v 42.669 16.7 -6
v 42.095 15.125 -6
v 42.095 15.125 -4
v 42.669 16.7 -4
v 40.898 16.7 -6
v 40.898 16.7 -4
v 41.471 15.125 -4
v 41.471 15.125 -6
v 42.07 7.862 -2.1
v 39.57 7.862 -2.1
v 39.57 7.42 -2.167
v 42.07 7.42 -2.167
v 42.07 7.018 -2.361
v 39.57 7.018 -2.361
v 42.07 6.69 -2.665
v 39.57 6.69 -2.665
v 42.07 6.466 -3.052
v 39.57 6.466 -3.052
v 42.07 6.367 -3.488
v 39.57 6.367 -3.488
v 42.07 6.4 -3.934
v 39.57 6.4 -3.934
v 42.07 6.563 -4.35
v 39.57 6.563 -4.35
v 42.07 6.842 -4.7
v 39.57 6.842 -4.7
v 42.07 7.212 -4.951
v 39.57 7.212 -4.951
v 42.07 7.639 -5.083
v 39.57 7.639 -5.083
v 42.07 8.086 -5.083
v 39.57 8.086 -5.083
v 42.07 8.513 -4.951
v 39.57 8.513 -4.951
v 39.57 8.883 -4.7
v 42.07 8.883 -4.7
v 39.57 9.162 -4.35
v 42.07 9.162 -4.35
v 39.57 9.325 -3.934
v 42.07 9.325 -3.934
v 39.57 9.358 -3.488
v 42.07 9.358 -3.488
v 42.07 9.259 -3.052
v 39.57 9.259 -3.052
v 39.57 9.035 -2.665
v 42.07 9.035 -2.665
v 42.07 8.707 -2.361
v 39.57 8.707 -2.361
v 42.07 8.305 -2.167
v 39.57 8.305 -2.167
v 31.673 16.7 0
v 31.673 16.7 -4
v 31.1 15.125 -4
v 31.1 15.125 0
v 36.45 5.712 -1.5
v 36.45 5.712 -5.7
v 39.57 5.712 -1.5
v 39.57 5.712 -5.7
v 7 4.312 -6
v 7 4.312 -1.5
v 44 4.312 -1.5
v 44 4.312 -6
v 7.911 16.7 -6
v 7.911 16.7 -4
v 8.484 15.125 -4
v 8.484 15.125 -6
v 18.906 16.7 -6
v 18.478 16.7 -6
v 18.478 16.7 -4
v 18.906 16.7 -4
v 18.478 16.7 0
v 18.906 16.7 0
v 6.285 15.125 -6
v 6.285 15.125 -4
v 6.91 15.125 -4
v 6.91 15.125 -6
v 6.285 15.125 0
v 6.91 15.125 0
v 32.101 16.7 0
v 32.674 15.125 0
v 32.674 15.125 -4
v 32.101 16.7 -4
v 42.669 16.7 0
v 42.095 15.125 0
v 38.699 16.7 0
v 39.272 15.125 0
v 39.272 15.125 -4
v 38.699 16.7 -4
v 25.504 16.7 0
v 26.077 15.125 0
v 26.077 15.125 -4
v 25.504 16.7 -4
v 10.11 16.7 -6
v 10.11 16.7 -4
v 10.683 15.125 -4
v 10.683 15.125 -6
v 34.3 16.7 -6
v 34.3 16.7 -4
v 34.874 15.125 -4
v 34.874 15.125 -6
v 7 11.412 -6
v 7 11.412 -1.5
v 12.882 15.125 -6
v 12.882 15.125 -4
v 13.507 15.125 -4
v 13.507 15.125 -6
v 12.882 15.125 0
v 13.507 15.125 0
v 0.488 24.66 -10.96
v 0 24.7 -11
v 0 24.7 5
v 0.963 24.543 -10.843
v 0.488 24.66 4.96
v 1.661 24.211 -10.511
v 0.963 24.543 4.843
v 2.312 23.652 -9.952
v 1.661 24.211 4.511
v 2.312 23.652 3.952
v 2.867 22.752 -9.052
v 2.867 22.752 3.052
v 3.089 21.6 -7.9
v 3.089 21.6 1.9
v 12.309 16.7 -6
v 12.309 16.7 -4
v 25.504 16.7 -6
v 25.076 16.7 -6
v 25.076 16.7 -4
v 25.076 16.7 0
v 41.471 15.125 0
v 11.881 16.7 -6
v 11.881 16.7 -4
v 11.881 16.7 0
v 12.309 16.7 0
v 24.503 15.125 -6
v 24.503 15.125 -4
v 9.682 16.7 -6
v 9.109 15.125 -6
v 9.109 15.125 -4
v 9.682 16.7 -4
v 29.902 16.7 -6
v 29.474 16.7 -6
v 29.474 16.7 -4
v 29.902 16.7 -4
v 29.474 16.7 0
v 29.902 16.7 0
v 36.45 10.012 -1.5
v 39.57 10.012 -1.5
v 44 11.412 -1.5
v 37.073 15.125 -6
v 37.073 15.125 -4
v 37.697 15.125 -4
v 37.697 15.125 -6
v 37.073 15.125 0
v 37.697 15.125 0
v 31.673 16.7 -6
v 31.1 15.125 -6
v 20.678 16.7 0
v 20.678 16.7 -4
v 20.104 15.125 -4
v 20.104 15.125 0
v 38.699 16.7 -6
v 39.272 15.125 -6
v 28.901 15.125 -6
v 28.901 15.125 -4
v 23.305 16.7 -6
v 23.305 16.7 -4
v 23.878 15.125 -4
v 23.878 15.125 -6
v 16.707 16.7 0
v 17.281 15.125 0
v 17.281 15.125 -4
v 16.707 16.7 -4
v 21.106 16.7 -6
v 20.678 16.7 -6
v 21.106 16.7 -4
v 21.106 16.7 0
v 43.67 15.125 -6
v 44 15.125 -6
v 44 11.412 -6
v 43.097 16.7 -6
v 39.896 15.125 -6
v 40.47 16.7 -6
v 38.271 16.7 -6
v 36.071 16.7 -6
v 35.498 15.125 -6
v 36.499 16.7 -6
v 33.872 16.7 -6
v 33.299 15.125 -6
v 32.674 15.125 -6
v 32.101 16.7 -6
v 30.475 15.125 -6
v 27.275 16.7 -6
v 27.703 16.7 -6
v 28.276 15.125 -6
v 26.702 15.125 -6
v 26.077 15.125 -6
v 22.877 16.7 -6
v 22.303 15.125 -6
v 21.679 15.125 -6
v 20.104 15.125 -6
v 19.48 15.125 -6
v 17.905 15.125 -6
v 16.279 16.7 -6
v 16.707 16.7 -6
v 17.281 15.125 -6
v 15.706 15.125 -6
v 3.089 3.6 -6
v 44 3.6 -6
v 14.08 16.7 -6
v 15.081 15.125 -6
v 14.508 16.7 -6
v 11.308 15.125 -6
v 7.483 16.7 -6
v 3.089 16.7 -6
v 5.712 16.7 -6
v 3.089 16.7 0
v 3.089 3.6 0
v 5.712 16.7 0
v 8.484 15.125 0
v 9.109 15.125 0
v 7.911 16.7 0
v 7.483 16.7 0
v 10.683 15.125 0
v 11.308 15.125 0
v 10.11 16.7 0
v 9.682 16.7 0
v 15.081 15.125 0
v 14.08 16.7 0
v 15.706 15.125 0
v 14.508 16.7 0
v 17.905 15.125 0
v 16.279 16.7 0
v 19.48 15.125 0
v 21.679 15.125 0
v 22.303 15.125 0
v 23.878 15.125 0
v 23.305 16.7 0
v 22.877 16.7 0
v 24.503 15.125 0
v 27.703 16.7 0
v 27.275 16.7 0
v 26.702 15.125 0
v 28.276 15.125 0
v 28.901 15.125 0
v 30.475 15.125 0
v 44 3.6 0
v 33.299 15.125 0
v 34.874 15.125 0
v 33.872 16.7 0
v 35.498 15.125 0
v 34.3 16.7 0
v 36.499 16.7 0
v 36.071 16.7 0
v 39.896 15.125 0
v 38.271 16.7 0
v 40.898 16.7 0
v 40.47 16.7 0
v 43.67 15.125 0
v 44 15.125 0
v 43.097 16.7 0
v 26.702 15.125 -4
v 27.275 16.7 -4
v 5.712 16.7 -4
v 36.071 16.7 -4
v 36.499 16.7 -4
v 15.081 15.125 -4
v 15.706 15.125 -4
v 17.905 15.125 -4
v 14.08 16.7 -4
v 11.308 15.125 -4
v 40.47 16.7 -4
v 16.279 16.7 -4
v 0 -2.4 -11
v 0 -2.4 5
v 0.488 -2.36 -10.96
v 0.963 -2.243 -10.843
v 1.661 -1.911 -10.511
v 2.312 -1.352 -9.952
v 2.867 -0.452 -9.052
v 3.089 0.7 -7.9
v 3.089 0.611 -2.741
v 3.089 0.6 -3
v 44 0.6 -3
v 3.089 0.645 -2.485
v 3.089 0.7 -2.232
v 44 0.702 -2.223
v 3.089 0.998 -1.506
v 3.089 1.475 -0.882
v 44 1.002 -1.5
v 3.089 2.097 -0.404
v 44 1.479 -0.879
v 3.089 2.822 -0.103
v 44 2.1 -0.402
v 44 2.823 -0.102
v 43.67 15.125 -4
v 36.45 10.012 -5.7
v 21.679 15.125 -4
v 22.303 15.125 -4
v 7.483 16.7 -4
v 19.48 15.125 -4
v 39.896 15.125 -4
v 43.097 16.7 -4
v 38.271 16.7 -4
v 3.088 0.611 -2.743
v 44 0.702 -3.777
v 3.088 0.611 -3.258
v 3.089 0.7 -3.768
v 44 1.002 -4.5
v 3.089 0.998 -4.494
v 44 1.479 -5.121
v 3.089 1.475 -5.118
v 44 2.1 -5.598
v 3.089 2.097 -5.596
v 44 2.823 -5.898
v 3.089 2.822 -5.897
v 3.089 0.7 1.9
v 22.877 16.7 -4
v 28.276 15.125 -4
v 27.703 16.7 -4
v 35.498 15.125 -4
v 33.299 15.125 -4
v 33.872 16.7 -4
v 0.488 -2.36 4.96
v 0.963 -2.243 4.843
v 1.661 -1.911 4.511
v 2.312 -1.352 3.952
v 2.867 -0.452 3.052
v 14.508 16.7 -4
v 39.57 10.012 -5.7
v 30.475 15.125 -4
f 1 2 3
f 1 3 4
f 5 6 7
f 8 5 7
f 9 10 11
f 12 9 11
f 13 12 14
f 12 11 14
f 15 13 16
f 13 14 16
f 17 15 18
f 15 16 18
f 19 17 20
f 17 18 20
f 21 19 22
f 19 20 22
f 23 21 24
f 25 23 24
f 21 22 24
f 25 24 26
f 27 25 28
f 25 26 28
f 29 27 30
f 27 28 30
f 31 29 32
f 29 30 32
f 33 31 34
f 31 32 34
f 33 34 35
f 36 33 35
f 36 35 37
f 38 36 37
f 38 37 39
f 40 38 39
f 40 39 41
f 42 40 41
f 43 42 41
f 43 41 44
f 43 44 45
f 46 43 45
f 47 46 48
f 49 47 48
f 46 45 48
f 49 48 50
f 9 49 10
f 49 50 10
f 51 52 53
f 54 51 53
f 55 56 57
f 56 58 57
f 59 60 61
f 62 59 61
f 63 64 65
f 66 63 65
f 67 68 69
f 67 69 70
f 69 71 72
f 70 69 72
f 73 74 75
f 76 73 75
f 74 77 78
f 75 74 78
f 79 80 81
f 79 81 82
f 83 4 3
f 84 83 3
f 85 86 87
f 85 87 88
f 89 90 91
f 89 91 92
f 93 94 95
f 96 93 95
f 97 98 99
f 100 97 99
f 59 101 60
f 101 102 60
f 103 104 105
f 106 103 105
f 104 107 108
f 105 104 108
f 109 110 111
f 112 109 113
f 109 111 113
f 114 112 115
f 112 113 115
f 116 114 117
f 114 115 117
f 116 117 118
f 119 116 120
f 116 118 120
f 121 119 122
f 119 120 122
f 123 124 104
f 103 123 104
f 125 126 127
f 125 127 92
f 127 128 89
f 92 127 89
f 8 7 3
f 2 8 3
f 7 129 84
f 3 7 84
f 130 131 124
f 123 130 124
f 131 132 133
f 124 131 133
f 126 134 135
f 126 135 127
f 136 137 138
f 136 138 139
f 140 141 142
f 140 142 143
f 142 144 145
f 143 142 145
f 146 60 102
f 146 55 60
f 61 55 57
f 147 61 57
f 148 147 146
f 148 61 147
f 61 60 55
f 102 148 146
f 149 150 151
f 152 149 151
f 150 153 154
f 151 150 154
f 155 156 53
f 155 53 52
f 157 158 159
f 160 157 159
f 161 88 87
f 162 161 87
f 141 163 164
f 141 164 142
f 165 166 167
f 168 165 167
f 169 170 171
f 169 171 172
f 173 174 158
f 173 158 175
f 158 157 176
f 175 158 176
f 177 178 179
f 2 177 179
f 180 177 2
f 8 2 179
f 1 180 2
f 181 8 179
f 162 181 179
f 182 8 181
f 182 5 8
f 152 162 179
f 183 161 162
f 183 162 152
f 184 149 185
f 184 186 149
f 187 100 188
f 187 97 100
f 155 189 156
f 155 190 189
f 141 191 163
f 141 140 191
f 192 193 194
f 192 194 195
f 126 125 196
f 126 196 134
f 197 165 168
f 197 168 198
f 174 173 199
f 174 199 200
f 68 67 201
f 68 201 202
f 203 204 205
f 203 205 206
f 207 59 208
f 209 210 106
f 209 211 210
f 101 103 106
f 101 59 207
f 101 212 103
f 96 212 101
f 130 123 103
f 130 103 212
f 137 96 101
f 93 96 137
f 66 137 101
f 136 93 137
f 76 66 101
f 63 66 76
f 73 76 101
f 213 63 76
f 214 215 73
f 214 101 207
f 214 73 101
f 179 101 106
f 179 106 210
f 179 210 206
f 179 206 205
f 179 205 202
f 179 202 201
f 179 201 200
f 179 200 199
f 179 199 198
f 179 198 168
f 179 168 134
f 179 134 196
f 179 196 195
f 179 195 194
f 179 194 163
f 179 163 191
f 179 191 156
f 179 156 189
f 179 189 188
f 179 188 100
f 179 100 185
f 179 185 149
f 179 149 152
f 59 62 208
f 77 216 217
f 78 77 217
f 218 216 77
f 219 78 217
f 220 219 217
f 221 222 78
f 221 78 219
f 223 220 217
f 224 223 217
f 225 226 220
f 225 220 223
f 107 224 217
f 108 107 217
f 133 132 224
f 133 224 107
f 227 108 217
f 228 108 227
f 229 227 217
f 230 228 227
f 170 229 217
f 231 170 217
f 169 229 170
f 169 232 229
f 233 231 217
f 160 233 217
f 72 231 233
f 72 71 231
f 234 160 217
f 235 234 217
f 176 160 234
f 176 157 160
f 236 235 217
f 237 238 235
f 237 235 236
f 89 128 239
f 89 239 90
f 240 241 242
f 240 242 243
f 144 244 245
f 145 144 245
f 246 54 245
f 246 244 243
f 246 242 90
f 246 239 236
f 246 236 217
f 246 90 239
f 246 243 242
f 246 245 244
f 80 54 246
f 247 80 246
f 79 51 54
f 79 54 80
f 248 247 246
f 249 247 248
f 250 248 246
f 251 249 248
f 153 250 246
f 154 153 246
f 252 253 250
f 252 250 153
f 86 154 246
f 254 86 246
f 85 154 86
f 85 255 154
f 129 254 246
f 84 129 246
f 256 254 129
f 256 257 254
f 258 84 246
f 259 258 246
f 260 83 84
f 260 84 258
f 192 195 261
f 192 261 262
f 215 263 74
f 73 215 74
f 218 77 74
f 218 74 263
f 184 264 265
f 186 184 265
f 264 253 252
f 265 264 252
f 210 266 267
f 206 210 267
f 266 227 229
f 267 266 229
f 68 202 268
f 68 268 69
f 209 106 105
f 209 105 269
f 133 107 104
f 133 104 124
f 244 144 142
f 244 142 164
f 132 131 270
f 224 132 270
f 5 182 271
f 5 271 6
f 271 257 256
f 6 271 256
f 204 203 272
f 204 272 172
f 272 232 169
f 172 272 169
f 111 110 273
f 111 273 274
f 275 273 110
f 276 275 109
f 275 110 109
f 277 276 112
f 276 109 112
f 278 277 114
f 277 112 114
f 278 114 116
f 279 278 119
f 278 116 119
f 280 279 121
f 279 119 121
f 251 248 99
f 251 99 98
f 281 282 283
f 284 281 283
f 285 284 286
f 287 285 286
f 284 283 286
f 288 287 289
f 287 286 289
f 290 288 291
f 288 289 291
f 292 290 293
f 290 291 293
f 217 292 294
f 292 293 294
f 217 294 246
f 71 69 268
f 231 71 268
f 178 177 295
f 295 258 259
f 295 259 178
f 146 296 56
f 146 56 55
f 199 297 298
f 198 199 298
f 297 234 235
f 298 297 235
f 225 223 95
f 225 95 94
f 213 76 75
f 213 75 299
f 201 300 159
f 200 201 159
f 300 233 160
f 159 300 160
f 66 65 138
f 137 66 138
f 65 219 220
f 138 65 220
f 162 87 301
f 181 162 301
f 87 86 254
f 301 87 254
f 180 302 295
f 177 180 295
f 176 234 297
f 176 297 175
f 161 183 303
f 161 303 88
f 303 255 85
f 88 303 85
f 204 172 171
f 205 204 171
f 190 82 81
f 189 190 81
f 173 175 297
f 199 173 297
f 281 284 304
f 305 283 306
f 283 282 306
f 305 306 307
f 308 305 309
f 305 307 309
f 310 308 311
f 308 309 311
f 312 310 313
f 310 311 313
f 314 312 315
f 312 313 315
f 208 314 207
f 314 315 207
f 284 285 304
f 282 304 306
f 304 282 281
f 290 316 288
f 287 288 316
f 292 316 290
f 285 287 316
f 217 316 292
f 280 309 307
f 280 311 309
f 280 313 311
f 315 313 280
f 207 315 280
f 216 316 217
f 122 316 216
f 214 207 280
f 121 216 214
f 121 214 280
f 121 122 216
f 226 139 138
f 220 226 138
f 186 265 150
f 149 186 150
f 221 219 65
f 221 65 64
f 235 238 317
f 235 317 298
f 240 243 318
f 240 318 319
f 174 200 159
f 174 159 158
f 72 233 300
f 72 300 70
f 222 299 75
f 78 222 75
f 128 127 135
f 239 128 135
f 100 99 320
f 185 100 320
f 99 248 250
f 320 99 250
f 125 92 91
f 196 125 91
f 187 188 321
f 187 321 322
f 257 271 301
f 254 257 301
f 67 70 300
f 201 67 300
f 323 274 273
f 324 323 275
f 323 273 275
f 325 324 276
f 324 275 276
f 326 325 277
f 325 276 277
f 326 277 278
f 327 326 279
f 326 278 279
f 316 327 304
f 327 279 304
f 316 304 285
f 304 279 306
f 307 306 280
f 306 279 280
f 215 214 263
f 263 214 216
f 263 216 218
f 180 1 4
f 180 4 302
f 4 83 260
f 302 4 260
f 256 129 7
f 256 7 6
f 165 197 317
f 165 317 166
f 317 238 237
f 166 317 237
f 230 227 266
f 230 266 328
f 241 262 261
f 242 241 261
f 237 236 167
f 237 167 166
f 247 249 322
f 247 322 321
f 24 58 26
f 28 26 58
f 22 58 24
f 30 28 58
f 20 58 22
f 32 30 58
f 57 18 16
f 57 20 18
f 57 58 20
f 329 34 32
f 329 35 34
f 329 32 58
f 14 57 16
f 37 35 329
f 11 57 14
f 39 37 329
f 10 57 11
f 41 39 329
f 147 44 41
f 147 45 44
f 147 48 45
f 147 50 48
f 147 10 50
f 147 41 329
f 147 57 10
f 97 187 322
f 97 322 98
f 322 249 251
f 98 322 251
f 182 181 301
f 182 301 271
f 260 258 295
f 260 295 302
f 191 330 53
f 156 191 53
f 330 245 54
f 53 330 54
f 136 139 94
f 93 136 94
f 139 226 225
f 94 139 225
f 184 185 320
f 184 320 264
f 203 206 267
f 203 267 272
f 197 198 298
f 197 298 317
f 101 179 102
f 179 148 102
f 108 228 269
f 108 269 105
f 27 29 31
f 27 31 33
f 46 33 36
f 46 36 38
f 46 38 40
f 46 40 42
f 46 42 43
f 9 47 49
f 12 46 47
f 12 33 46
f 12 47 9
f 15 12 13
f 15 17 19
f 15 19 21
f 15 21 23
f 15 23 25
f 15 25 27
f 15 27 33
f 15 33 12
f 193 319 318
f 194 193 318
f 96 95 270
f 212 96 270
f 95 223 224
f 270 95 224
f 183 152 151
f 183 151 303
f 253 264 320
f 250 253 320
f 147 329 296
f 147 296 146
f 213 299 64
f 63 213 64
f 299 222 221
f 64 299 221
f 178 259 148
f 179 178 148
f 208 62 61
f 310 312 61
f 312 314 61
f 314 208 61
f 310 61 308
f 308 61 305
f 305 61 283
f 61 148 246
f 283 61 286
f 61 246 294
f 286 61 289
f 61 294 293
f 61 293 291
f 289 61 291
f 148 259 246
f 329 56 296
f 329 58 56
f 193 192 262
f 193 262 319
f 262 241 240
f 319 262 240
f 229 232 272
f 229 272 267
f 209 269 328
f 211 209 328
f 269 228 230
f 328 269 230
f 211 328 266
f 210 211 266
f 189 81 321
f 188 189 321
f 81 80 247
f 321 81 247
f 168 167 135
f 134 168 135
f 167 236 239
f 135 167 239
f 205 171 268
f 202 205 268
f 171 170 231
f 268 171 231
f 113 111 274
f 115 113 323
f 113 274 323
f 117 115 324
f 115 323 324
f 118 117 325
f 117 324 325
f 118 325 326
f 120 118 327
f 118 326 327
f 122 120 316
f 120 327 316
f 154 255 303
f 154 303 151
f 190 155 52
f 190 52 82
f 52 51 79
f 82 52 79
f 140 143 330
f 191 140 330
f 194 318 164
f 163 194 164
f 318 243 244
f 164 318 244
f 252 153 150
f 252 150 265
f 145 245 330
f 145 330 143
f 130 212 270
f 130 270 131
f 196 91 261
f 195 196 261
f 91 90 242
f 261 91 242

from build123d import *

# Parameters (mm, degrees)
BLANKSKE_W               = 44
BLANKSKE_H               = 16.7
BLANK_DEPTH              = 4
TOOTHCUTSIM_DEPTH        = 48.232298271
TEETHCUTS_COUNT          = 21
TEETHCUTS_PITCH          = 2.199114855
CROQUIS2_W               = 44
CROQUIS2_H               = 4
CORTAR_EXTRUIR2_DEPTH    = 0.6
CROQUIS3_W               = 2.5
CROQUIS3_H               = 7.1
CORTAR_EXTRUIR3_DEPTH    = 37
CROQUIS4_W               = 5.711786687
CROQUIS4_H               = 1.575
SALIENTE_EXTRUIR4_DEPTH  = 4
CROQUIS5_W               = 1.12
CROQUIS5_H               = 4.3
SALIENTE_EXTRUIR5_DEPTH  = 4.2
CROQUIS14_R              = 1.5
SALIENTE_EXTRUIR11_DEPTH = 2.5
CROQUIS15_W              = 3.088906297
CROQUIS15_H              = 16.1
SALIENTE_EXTRUIR12_DEPTH = 5
CROQUIS16_W              = 2.855893344
CROQUIS16_H              = 16.1
SALIENTE_EXTRUIR13_DEPTH = 5
SALIENTE_EXTRUIR14_DEPTH = 2
CROQUIS18_W              = 4.2
CROQUIS18_H              = 4.3
SALIENTE_EXTRUIR15_DEPTH = 2
CROQUIS19_W              = 2.855893344
CROQUIS19_H              = 14
SALIENTE_EXTRUIR16_DEPTH = 8
CROQUIS20_W              = 2.855893344
CROQUIS20_H              = 24.1
SALIENTE_EXTRUIR18_DEPTH = 2
SALIENTE_EXTRUIR19_DEPTH = 3
CROQUIS31_W              = 2.855893344
CROQUIS31_H              = 27.1
SALIENTE_EXTRUIR20_DEPTH = 16
CROQUIS32_W              = 3.088906297
CROQUIS32_H              = 27.1
SALIENTE_EXTRUIR21_DEPTH = 16
REDONDEO3_R              = 3
REDONDEO4_R              = 3.1


# Some blends are built 0.0001 mm under size
with BuildPart() as part:
    # BlankSke → Blank (new body)
    with BuildSketch(Plane.XY):
        with Locations((22, 8.35)):
            Rectangle(BLANKSKE_W, BLANKSKE_H)
    extrude(amount=-BLANK_DEPTH)

    # TooCutSkeSim → ToothCutSim (cut, through all)
    with BuildSketch(Plane.XY):
        Polygon((0.312304759, 15.125), (-0.312304759, 15.125), (-0.894802722, 16.7254), (0.894802722, 16.7254), align=None)
    toothcutsim = extrude(amount=-TOOTHCUTSIM_DEPTH, mode=Mode.SUBTRACT)

    # TeethCuts: ToothCutSim ×21
    with Locations(*[(i * TEETHCUTS_PITCH, 0, 0) for i in range(1, TEETHCUTS_COUNT)]):
        add(toothcutsim, mode=Mode.SUBTRACT)

    # Croquis2 → Cortar-Extruir2 (cut)
    with BuildSketch(Plane.XZ):
        with Locations((22, -2)):
            Rectangle(CROQUIS2_W, CROQUIS2_H)
    extrude(amount=-CORTAR_EXTRUIR2_DEPTH, mode=Mode.SUBTRACT)

    # Croquis3 → Cortar-Extruir3 (cut)
    with BuildSketch(Plane(origin=(44, 0, 0), x_dir=(0, 0, -1), z_dir=(1, 0, 0))):
        with Locations((2.75, 7.8625)):
            Rectangle(CROQUIS3_W, CROQUIS3_H)
    extrude(amount=-CORTAR_EXTRUIR3_DEPTH, mode=Mode.SUBTRACT)

    # Croquis4 → Saliente-Extruir4 (add)
    with BuildSketch(Plane.XY):
        with Locations((2.855893344, 15.9125)):
            Rectangle(CROQUIS4_W, CROQUIS4_H)
    extrude(amount=-SALIENTE_EXTRUIR4_DEPTH)

    # Croquis5 → Saliente-Extruir5 (add)
    with BuildSketch(Plane(origin=(0, 0, -1.5), x_dir=(-1, 0, 0), z_dir=(0, 0, -1))):
        with Locations((-39.01, 7.8625)):
            Rectangle(CROQUIS5_W, CROQUIS5_H)
    extrude(amount=SALIENTE_EXTRUIR5_DEPTH)

    # Croquis14 → Saliente-Extruir11 (add)
    with BuildSketch(Plane(origin=(39.57, 0, 0), x_dir=(0, 0, -1), z_dir=(1, 0, 0))):
        with Locations(Location((3.6, 7.8625, 0), (0, 0, 180))):
            Circle(CROQUIS14_R)
    extrude(amount=SALIENTE_EXTRUIR11_DEPTH)

    # Croquis15 → Saliente-Extruir12 (add)
    with BuildSketch(Plane.XY):
        with Locations((1.544453149, 8.65)):
            Rectangle(CROQUIS15_W, CROQUIS15_H)
    extrude(amount=SALIENTE_EXTRUIR12_DEPTH)

    # Croquis16 → Saliente-Extruir13 (add)
    with BuildSketch(Plane(origin=(0, 0, -4), x_dir=(-1, 0, 0), z_dir=(0, 0, -1))):
        with Locations((-1.427946672, 8.65)):
            Rectangle(CROQUIS16_W, CROQUIS16_H)
    extrude(amount=SALIENTE_EXTRUIR13_DEPTH)

    # Croquis17 → Saliente-Extruir14 (add)
    with BuildSketch(Plane(origin=(0, 0, -4), x_dir=(-1, 0, 0), z_dir=(0, 0, -1))):
        Polygon((-44, 0.6), (-2.855893344, 0.6), (-2.855893344, 16.7), (-5.711786687, 16.7), (-6.285039806, 15.125), (-6.909649324, 15.125), (-7.482902443, 16.7), (-7.910901542, 16.7), (-8.484154661, 15.125), (-9.108764179, 15.125), (-9.682017298, 16.7), (-10.110016397, 16.7), (-10.683269516, 15.125), (-11.307879034, 15.125), (-11.881132153, 16.7), (-12.309131252, 16.7), (-12.882384371, 15.125), (-13.506993889, 15.125), (-14.080247008, 16.7), (-14.508246107, 16.7), (-15.081499226, 15.125), (-15.706108744, 15.125), (-16.279361863, 16.7), (-16.707360962, 16.7), (-17.280614081, 15.125), (-17.905223599, 15.125), (-18.478476718, 16.7), (-18.906475817, 16.7), (-19.479728936, 15.125), (-20.104338454, 15.125), (-20.677591573, 16.7), (-21.105590672, 16.7), (-21.678843791, 15.125), (-22.303453309, 15.125), (-22.876706428, 16.7), (-23.304705527, 16.7), (-23.877958646, 15.125), (-24.502568164, 15.125), (-25.075821283, 16.7), (-25.503820382, 16.7), (-26.077073501, 15.125), (-26.701683019, 15.125), (-27.274936138, 16.7), (-27.702935237, 16.7), (-28.276188356, 15.125), (-28.900797874, 15.125), (-29.474050993, 16.7), (-29.902050092, 16.7), (-30.475303211, 15.125), (-31.099912729, 15.125), (-31.673165848, 16.7), (-32.101164947, 16.7), (-32.674418066, 15.125), (-33.299027584, 15.125), (-33.872280703, 16.7), (-34.300279802, 16.7), (-34.873532921, 15.125), (-35.498142439, 15.125), (-36.071395558, 16.7), (-36.499394657, 16.7), (-37.072647776, 15.125), (-37.697257294, 15.125), (-38.270510413, 16.7), (-38.698509512, 16.7), (-39.271762631, 15.125), (-39.896372149, 15.125), (-40.469625268, 16.7), (-40.897624367, 16.7), (-41.470877486, 15.125), (-42.095487004, 15.125), (-42.668740123, 16.7), (-43.096739222, 16.7), (-43.669992341, 15.125), (-44, 15.125), (-44, 11.4125), (-7, 11.4125), (-7, 4.3125), (-44, 4.3125), align=None)
    extrude(amount=SALIENTE_EXTRUIR14_DEPTH)

    # Croquis18 → Saliente-Extruir15 (add)
    with BuildSketch(Plane.ZY.offset(-38.45)):
        with Locations((-3.6, 7.8625)):
            Rectangle(CROQUIS18_W, CROQUIS18_H)
    extrude(amount=SALIENTE_EXTRUIR15_DEPTH)

    # Croquis19 → Saliente-Extruir16 (add)
    with BuildSketch(Plane(origin=(0, 16.7, 0), x_dir=(1, 0, 0), z_dir=(0, 1, 0))):
        with Locations((1.427946672, 2)):
            Rectangle(CROQUIS19_W, CROQUIS19_H)
    extrude(amount=SALIENTE_EXTRUIR16_DEPTH)

    # Croquis20 → Saliente-Extruir18 (add)
    with BuildSketch(Plane(origin=(0, 0, -9), x_dir=(-1, 0, 0), z_dir=(0, 0, -1))):
        with Locations((-1.427946672, 12.65)):
            Rectangle(CROQUIS20_W, CROQUIS20_H)
    extrude(amount=SALIENTE_EXTRUIR18_DEPTH)

    # Croquis21 → Saliente-Extruir19 (add)
    with BuildSketch(Plane.XZ.offset(-0.6)):
        Polygon((3.088906297, 0), (2.855893344, -6), (2.855893344, -11), (0, -11), (0, 5), (3.088906297, 5), align=None)
    extrude(amount=SALIENTE_EXTRUIR19_DEPTH)

    # Croquis31 → Saliente-Extruir20 (add)
    with BuildSketch(Plane(origin=(0, 0, -11), x_dir=(-1, 0, 0), z_dir=(0, 0, -1))):
        with Locations((-1.427946672, 11.15)):
            Rectangle(CROQUIS31_W, CROQUIS31_H)
    extrude(amount=-SALIENTE_EXTRUIR20_DEPTH)

    # Croquis32 → Saliente-Extruir21 (add)
    with BuildSketch(Plane.XY.offset(5)):
        with Locations((1.544453149, 11.15)):
            Rectangle(CROQUIS32_W, CROQUIS32_H)
    extrude(amount=-SALIENTE_EXTRUIR21_DEPTH)

    # Redondeo3
    redondeo3_edges = [part.edges().sort_by_distance(p)[0] for p in [
        (23.544453148, 0.6, -6),
        (23.544453148, 0.6, 0),
    ]]
    fillet(redondeo3_edges, radius=REDONDEO3_R - 0.0001)  # a hair under: the kernel refuses the full size

    # Redondeo4
    # the kernel refuses this fillet: 3.1 mm, written as the material it takes off along each edge
    with BuildSketch(Plane(origin=(3.088906297, -2.4, -18.75), x_dir=(0, 1, 0), z_dir=(0, 0, 1))) as redondeo4_piece_1_section:
        with BuildLine():
            CenterArc((REDONDEO4_R, REDONDEO4_R), REDONDEO4_R, 180, 90)
            Line((0, REDONDEO4_R), (0, 0))
            Line((0, 0), (REDONDEO4_R, 0))
        make_face()
    redondeo4_piece_1 = extrude(amount=31.5, mode=Mode.PRIVATE)
    redondeo4_piece_1 = redondeo4_piece_1 - Plane(origin=(2.386115021, 3.5999, -3.0001), x_dir=(0, -1, 0), z_dir=(-1, 0, 0)) * Cylinder(2.9999, 76, mode=Mode.PRIVATE)
    add(redondeo4_piece_1, mode=Mode.SUBTRACT)
    with BuildSketch(Plane(origin=(3.088906297, -10.15, 5), x_dir=(0, 0, -1), z_dir=(0, 1, 0)), Plane(origin=(3.088906297, 32.45, -11), x_dir=(0, 0, 1), z_dir=(0, -1, 0))) as redondeo4_piece_2:
        with BuildLine():
            CenterArc((REDONDEO4_R, REDONDEO4_R), REDONDEO4_R, 180, 90)
            Line((0, REDONDEO4_R), (0, 0))
            Line((0, 0), (REDONDEO4_R, 0))
        make_face()
    extrude(amount=42.6, mode=Mode.SUBTRACT)
    with BuildSketch(Plane(origin=(3.088906297, 24.7, 12.75), x_dir=(0, -1, 0), z_dir=(0, 0, -1))) as redondeo4_piece_3:
        with BuildLine():
            CenterArc((REDONDEO4_R, REDONDEO4_R), REDONDEO4_R, 180, 90)
            Line((0, REDONDEO4_R), (0, 0))
            Line((0, 0), (REDONDEO4_R, 0))
        make_face()
    extrude(amount=31.5, mode=Mode.SUBTRACT)


solid = part.part
